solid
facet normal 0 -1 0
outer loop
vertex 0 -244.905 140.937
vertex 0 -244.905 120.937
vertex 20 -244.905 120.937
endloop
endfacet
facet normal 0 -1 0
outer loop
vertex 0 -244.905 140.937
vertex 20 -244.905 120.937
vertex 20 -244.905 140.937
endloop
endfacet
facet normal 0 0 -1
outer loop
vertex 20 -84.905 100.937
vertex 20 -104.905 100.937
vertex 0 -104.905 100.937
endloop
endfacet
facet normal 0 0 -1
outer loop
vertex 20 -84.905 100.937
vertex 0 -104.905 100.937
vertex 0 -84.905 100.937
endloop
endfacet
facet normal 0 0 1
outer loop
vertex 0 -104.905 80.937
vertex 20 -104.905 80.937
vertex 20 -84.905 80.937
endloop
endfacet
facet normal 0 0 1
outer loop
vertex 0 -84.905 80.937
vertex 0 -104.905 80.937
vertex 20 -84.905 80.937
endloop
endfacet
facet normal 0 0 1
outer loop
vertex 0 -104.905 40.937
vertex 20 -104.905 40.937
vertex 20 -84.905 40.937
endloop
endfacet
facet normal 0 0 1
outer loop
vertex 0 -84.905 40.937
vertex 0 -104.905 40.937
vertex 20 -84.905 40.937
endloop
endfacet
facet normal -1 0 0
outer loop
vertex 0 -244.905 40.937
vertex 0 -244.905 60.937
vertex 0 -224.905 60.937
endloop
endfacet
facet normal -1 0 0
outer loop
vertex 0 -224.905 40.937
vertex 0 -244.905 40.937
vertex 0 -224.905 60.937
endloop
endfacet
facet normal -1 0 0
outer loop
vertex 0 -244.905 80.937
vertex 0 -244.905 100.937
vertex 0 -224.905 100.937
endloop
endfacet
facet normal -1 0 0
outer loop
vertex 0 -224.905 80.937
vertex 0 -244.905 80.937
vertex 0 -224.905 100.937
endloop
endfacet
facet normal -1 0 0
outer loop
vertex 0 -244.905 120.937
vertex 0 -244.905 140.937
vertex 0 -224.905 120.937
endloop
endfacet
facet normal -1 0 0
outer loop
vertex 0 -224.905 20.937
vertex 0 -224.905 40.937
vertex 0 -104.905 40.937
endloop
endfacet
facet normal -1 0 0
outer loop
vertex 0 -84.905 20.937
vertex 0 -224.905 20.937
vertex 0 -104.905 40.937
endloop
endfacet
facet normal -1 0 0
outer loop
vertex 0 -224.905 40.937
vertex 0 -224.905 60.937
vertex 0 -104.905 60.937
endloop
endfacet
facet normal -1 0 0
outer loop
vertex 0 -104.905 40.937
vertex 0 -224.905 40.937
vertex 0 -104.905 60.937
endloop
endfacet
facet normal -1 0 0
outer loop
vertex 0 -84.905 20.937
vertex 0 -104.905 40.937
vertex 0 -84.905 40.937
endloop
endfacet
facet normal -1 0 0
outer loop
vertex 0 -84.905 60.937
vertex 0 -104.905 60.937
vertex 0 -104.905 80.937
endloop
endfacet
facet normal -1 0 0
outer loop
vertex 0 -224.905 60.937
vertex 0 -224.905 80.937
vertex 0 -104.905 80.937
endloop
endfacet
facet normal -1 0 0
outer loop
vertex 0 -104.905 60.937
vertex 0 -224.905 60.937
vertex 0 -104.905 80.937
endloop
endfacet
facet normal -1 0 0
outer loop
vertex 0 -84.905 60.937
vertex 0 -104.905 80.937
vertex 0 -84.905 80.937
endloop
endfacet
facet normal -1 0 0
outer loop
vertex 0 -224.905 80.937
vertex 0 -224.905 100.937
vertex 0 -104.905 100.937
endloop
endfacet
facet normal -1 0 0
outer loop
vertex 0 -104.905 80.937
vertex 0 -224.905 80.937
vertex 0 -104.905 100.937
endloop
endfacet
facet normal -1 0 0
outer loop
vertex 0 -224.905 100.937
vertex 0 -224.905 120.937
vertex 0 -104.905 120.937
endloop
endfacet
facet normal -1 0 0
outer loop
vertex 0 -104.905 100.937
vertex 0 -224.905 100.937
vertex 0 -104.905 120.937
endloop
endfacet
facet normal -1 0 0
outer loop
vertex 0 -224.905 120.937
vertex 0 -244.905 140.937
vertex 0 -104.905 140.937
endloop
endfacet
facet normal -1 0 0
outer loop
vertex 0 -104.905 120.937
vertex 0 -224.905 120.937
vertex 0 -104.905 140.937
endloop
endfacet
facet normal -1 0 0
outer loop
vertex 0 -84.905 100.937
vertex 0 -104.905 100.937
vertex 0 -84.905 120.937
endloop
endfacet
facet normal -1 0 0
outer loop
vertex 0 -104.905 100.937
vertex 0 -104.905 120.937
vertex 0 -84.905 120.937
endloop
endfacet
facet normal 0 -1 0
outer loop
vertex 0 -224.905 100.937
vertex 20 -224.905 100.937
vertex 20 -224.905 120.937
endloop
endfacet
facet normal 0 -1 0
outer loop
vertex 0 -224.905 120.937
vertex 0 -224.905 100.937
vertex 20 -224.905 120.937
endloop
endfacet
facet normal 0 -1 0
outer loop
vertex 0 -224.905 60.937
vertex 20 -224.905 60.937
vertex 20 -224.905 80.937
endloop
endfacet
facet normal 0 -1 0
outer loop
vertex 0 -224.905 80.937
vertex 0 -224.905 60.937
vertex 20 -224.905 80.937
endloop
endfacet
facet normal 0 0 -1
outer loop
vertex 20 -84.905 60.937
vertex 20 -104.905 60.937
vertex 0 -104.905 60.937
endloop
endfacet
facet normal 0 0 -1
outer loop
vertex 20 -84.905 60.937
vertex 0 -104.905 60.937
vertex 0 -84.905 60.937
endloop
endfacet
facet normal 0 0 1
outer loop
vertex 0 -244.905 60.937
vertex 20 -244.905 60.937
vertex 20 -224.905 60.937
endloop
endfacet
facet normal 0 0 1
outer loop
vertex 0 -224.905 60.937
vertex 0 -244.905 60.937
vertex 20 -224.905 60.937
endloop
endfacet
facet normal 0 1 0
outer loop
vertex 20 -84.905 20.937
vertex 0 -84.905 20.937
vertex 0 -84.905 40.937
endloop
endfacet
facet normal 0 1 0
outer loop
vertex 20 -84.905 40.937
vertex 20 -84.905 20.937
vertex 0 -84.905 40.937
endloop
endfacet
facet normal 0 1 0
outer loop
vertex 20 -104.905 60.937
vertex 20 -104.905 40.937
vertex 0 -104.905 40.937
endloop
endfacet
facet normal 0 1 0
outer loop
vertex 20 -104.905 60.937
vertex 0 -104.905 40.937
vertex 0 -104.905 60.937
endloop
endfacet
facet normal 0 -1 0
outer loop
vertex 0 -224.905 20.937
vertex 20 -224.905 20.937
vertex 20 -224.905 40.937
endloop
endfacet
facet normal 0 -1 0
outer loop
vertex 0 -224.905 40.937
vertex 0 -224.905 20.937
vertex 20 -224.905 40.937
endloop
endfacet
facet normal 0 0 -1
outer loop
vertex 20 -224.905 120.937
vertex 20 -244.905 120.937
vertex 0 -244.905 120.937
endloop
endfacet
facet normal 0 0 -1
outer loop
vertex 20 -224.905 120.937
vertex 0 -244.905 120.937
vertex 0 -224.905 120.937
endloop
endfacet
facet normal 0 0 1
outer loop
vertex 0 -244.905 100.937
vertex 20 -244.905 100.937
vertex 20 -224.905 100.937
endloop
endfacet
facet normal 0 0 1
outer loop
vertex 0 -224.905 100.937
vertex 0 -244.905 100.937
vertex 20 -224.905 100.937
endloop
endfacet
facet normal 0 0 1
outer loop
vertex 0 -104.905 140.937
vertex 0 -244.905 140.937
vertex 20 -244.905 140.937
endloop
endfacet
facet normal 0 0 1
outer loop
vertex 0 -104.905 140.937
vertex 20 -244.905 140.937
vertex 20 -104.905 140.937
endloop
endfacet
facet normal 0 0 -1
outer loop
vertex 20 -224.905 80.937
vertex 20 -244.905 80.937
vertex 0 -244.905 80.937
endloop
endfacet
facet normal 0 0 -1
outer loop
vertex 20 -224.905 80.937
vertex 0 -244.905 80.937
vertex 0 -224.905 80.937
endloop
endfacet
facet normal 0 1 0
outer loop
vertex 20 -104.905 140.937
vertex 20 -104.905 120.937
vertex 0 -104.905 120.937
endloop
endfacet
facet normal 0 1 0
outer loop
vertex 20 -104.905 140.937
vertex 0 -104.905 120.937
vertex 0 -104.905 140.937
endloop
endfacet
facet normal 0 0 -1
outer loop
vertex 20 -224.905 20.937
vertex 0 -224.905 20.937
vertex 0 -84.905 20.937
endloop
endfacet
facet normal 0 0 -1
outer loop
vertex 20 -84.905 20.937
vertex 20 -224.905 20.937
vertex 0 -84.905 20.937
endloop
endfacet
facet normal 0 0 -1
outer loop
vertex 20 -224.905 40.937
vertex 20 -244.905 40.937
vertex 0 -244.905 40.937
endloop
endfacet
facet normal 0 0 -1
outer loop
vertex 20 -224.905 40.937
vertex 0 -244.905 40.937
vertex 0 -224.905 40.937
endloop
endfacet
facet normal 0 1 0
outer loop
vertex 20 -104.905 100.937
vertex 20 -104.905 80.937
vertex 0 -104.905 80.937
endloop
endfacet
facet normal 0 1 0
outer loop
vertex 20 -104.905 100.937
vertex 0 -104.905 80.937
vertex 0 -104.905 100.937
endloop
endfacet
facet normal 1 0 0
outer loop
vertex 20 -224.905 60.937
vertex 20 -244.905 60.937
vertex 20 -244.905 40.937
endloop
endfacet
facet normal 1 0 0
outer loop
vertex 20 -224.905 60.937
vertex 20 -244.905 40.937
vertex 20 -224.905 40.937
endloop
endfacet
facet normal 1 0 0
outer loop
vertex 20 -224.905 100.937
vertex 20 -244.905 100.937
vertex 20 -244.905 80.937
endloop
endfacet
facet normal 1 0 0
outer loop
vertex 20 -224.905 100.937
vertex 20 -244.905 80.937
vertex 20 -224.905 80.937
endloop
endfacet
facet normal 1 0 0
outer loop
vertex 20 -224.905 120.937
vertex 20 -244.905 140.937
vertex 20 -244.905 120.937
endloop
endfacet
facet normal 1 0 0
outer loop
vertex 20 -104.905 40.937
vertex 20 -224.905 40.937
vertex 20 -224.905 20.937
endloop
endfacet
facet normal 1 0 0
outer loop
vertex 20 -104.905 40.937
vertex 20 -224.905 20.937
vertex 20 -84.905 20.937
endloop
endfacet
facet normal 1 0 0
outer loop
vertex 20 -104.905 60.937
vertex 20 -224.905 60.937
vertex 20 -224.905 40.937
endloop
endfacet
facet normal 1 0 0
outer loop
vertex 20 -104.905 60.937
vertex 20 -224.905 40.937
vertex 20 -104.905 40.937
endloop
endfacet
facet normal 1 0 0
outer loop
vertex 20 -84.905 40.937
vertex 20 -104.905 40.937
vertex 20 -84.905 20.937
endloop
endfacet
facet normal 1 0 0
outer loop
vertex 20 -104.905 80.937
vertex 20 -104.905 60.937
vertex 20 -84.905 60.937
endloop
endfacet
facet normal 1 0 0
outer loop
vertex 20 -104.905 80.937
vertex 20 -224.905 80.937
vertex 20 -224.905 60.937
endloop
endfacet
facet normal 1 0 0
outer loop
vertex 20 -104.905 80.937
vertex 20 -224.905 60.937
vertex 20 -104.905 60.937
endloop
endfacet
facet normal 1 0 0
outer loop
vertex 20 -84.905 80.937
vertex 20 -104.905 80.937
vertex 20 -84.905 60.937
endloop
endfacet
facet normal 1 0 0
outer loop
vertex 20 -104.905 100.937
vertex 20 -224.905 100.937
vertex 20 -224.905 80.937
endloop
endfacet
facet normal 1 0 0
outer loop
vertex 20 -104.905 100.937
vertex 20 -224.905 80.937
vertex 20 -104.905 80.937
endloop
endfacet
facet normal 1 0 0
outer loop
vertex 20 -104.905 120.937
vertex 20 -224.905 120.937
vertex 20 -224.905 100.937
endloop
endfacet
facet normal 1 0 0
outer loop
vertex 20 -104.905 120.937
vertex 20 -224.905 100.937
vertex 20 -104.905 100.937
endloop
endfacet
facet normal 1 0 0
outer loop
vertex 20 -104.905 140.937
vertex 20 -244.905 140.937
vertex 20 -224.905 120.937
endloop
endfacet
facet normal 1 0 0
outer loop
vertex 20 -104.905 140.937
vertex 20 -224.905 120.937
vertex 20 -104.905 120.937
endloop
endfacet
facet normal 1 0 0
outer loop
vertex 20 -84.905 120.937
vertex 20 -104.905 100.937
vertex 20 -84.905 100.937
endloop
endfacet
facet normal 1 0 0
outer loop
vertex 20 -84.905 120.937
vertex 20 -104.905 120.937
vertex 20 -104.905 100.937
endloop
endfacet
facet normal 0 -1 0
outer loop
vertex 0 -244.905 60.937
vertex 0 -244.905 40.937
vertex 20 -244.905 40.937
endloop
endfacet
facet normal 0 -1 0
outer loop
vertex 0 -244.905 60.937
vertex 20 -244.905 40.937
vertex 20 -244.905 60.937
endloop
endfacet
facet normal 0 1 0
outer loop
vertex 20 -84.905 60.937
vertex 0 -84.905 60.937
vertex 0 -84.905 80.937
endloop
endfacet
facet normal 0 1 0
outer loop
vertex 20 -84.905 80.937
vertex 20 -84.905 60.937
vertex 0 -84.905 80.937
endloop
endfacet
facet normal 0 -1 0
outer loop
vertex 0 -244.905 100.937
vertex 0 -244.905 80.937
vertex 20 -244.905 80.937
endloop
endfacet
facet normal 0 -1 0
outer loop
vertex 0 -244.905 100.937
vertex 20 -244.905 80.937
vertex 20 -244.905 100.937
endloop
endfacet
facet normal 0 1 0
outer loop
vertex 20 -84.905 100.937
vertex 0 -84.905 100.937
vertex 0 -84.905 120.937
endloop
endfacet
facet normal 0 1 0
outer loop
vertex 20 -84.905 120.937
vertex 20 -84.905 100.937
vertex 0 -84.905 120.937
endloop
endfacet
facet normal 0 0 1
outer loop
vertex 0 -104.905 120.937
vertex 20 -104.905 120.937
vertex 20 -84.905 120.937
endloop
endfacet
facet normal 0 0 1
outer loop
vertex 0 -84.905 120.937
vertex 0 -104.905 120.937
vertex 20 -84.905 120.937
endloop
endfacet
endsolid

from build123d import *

# Parameters (mm, degrees)
F0_W      = 160
F0_H      = 120
F1_DEPTH  = 20
F2_W      = 20
F2_H      = 20
F3_DEPTH  = 20
F4_W      = 20
F4_H      = 20
F5_DEPTH  = 20
F6_W      = 20
F6_H      = 20
F7_DEPTH  = 20
F8_W      = 20
F8_H      = 20
F9_DEPTH  = 20
F10_W     = 20
F10_H     = 20
F11_DEPTH = 20
F12_W     = 20
F12_H     = 20
F13_DEPTH = 20


with BuildPart() as f1:
    # F0 (on Right) → F1 (new body)
    with BuildSketch(Plane.YZ):
        with Locations((-164.905177, 80.936906)):
            Rectangle(F0_W, F0_H)
    extrude(amount=F1_DEPTH)

    # F2 (on face) → F3 (cut)
    with BuildSketch(Plane.YZ.offset(20)):
        with Locations((-234.905177, 110.936906)):
            Rectangle(F2_W, F2_H)
    extrude(amount=-F3_DEPTH, mode=Mode.SUBTRACT)

    # F4 (on face) → F5 (cut)
    with BuildSketch(Plane.YZ.offset(20)):
        with Locations((-234.905177, 70.936906)):
            Rectangle(F4_W, F4_H)
    extrude(amount=-F5_DEPTH, mode=Mode.SUBTRACT)

    # F6 (on face) → F7 (cut)
    with BuildSketch(Plane.YZ.offset(20)):
        with Locations((-234.905177, 30.936906)):
            Rectangle(F6_W, F6_H)
    extrude(amount=-F7_DEPTH, mode=Mode.SUBTRACT)

    # F8 (on face) → F9 (cut)
    with BuildSketch(Plane.YZ.offset(20)):
        with Locations((-94.905177, 130.936906)):
            Rectangle(F8_W, F8_H)
    extrude(amount=-F9_DEPTH, mode=Mode.SUBTRACT)

    # F10 (on face) → F11 (cut)
    with BuildSketch(Plane.YZ.offset(20)):
        with Locations((-94.905177, 90.936906)):
            Rectangle(F10_W, F10_H)
    extrude(amount=-F11_DEPTH, mode=Mode.SUBTRACT)

    # F12 (on face) → F13 (cut)
    with BuildSketch(Plane.YZ.offset(20)):
        with Locations((-94.905177, 50.936906)):
            Rectangle(F12_W, F12_H)
    extrude(amount=-F13_DEPTH, mode=Mode.SUBTRACT)


solid = f1.part
